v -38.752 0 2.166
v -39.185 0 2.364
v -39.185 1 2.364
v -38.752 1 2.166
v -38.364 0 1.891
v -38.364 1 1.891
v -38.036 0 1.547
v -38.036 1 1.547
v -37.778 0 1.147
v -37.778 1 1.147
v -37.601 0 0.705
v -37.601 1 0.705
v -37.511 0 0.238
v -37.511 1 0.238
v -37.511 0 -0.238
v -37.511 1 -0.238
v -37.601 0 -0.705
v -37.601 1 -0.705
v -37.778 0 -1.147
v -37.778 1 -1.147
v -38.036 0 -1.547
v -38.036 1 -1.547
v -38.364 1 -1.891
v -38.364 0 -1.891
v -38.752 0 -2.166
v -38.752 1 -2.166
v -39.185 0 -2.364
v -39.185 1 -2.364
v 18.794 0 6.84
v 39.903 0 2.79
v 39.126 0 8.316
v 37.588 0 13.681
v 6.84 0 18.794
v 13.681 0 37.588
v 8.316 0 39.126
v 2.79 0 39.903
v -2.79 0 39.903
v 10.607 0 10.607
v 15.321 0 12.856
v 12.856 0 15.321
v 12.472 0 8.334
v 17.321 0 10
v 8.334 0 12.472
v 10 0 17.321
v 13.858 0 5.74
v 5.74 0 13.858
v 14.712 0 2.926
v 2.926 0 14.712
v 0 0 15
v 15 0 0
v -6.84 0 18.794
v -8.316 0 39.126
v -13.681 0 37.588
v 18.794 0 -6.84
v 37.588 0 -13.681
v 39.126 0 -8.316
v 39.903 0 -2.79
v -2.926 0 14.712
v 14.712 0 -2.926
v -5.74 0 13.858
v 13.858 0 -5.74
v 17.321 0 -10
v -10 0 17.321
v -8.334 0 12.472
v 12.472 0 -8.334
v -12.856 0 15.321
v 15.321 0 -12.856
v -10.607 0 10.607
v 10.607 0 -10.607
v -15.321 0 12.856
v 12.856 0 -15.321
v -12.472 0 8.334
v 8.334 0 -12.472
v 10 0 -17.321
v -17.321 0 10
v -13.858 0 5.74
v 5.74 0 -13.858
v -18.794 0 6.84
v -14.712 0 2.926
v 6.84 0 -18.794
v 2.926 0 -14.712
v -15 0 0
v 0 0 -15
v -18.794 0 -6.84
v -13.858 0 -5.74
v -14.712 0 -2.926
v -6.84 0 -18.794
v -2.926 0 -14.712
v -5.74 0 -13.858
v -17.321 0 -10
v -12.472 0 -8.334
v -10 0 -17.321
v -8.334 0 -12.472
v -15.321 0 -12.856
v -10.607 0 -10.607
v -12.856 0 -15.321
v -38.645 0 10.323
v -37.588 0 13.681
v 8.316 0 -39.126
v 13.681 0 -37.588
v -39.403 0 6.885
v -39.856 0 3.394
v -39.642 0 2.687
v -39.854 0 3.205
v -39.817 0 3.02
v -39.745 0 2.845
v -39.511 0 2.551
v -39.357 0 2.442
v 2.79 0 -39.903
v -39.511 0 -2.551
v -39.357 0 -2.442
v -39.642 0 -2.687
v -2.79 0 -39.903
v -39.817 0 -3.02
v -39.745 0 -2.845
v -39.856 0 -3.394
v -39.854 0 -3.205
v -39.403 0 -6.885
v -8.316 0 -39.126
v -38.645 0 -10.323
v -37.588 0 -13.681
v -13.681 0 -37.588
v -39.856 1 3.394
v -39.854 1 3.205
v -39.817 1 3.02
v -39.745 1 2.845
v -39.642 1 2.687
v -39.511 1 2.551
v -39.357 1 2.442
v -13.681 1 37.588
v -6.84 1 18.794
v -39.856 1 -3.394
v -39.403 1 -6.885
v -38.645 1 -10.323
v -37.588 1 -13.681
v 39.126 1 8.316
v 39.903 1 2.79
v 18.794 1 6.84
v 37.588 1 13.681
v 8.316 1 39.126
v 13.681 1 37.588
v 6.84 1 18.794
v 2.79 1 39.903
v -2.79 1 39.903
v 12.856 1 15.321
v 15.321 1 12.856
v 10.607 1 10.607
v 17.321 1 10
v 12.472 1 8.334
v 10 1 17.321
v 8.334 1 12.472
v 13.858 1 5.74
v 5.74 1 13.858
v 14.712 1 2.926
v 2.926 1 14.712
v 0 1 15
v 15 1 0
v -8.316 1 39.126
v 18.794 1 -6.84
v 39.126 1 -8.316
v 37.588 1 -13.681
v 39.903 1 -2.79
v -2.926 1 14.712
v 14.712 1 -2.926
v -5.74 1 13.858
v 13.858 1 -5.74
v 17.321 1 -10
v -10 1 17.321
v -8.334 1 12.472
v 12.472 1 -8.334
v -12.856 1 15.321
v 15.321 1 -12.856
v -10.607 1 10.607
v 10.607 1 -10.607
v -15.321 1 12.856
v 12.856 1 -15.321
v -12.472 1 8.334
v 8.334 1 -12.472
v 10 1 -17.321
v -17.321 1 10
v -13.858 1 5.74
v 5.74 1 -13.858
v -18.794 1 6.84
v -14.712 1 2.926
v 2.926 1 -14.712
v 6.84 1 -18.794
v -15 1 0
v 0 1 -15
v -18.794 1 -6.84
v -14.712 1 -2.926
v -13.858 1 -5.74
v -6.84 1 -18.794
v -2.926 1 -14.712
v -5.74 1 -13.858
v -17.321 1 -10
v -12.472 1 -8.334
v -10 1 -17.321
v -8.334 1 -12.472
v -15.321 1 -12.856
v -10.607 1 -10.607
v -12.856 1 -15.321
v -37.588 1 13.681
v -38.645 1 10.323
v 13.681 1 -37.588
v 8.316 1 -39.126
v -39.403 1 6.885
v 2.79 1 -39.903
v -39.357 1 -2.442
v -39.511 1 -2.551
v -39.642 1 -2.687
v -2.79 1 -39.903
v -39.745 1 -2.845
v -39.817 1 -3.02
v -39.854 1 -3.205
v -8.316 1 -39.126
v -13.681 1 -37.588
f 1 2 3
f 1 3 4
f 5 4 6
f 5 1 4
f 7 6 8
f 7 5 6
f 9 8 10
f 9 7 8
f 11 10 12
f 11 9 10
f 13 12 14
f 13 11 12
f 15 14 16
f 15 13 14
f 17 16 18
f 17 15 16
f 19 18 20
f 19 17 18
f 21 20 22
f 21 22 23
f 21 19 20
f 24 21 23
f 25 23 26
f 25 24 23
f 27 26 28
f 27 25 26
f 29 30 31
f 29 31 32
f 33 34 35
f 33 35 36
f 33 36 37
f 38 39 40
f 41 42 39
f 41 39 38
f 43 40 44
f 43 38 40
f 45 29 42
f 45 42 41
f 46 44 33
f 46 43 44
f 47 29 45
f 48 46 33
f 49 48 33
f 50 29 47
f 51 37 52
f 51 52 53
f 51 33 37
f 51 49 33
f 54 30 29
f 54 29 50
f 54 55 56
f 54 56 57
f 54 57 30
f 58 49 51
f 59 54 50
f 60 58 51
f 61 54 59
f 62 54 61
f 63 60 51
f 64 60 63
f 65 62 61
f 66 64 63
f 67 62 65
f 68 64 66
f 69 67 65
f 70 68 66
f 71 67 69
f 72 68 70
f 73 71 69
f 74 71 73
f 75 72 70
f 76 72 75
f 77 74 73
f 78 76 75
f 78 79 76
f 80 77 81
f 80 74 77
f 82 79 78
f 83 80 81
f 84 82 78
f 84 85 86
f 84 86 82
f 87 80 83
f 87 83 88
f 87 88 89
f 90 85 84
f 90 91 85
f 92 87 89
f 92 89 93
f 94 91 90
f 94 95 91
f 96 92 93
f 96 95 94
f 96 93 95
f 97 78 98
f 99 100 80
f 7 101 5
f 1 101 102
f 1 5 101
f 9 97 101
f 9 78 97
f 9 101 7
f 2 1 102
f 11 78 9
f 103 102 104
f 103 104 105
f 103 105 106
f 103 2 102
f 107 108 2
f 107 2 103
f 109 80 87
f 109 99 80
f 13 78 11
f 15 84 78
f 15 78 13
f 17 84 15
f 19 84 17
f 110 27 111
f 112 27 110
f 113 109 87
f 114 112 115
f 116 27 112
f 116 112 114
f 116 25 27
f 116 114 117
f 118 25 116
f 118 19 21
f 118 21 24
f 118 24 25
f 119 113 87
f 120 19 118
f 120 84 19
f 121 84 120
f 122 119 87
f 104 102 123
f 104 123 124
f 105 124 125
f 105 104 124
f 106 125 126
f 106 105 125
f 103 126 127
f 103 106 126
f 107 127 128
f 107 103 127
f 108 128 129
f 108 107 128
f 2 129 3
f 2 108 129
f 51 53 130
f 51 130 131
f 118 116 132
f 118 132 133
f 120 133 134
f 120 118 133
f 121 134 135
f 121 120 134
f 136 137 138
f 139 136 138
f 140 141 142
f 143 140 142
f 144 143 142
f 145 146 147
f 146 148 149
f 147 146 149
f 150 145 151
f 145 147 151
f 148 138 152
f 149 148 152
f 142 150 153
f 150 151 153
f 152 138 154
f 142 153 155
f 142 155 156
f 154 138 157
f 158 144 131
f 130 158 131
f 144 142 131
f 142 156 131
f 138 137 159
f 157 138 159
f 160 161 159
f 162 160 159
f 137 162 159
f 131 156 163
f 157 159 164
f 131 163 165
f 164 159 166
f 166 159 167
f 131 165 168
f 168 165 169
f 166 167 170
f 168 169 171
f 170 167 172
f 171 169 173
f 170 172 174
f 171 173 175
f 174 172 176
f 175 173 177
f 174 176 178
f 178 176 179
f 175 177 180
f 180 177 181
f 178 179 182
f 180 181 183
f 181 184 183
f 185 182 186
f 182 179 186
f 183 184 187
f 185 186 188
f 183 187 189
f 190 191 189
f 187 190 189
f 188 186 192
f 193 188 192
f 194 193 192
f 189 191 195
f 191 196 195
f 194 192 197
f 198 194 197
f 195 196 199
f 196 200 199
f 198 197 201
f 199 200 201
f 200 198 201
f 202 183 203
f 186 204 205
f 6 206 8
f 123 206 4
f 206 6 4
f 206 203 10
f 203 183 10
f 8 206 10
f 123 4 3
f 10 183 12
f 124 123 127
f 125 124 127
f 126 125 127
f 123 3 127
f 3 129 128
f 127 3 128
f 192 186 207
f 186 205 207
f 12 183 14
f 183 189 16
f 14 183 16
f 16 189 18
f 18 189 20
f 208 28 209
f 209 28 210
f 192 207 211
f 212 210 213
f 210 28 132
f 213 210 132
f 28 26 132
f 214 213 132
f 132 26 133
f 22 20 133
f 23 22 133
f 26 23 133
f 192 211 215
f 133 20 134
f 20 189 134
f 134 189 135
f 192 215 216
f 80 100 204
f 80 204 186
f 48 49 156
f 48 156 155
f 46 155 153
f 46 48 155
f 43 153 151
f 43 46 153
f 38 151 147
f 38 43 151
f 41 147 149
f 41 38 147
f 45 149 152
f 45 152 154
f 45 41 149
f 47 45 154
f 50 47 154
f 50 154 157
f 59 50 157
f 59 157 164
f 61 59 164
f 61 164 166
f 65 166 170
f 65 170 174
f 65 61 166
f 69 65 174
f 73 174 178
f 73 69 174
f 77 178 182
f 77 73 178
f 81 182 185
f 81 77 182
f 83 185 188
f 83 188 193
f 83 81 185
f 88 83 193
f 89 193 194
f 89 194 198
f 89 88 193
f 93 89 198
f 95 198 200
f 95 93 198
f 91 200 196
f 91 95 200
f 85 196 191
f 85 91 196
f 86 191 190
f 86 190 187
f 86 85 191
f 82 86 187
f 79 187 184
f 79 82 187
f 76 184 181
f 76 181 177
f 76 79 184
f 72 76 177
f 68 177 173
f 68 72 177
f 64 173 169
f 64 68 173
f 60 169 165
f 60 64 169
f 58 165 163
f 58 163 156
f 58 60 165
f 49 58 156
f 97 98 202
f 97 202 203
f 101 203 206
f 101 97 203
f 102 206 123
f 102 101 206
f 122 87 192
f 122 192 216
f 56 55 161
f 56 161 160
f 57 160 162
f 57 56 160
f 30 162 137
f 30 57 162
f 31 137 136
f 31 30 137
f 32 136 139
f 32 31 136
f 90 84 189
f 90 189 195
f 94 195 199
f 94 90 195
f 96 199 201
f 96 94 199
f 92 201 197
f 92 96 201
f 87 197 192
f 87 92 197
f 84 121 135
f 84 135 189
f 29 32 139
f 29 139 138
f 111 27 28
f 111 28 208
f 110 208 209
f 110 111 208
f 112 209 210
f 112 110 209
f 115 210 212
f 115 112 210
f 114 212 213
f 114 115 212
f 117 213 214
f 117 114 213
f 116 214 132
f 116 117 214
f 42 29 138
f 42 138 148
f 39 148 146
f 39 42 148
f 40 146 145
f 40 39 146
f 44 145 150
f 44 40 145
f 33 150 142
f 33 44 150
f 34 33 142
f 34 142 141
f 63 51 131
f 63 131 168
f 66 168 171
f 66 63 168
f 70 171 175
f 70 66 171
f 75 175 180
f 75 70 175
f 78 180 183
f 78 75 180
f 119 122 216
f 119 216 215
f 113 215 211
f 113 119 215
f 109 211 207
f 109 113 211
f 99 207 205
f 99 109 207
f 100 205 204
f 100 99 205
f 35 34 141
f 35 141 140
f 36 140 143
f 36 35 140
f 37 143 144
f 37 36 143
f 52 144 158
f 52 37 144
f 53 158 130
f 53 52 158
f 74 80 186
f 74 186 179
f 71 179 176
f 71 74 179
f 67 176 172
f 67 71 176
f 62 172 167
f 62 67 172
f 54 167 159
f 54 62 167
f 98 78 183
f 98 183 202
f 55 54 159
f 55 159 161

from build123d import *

# Parameters (mm, degrees)
SKETCH1_R           = 15
BOSS_EXTRUDE1_DEPTH = 1


with BuildPart() as part:
    # Sketch1 → Boss-Extrude1 (new body)
    with BuildSketch(Plane(origin=(0, 0, 0), x_dir=(1, 0, 0), z_dir=(0, 1, 0))):
        with BuildLine():
            Line((37.587704831, -13.680805733), (18.793852416, -6.840402867))
            ThreePointArc((18.793852416, -6.840402867), (14.142135624, -14.142135624), (6.840402867, -18.793852416))
            Line((6.840402867, -18.793852416), (13.680805733, -37.587704831))
            ThreePointArc((13.680805733, -37.587704831), (0, -40), (-13.680805733, -37.587704831))
            Line((-13.680805733, -37.587704831), (-6.840402867, -18.793852416))
            ThreePointArc((-6.840402867, -18.793852416), (-14.142135624, -14.142135624), (-18.793852416, -6.840402867))
            Line((-18.793852416, -6.840402867), (-37.587704831, -13.680805733))
            ThreePointArc((-37.587704831, -13.680805733), (-39.061857441, -8.612275732), (-39.855769231, -3.393767674))
            ThreePointArc((-39.855769231, -3.393767674), (-39.69750686, -2.763455807), (-39.185267857, -2.363516773))
            ThreePointArc((-39.185267857, -2.363516773), (-37.5, 0), (-39.185267857, 2.363516773))
            ThreePointArc((-39.185267857, 2.363516773), (-39.69750686, 2.763455807), (-39.855769231, 3.393767674))
            ThreePointArc((-39.855769231, 3.393767674), (-39.061857441, 8.612275732), (-37.587704831, 13.680805733))
            Line((-37.587704831, 13.680805733), (-18.793852416, 6.840402867))
            ThreePointArc((-18.793852416, 6.840402867), (-14.142135624, 14.142135624), (-6.840402867, 18.793852416))
            Line((-6.840402867, 18.793852416), (-13.680805733, 37.587704831))
            ThreePointArc((-13.680805733, 37.587704831), (0, 40), (13.680805733, 37.587704831))
            Line((13.680805733, 37.587704831), (6.840402867, 18.793852416))
            ThreePointArc((6.840402867, 18.793852416), (14.142135624, 14.142135624), (18.793852416, 6.840402867))
            Line((18.793852416, 6.840402867), (37.587704831, 13.680805733))
            ThreePointArc((37.587704831, 13.680805733), (40, 0), (37.587704831, -13.680805733))
        make_face()
        with Locations(Location((0, 0, 0), (0, 0, 270))):
            Circle(SKETCH1_R, mode=Mode.SUBTRACT)
    extrude(amount=BOSS_EXTRUDE1_DEPTH)


solid = part.part
